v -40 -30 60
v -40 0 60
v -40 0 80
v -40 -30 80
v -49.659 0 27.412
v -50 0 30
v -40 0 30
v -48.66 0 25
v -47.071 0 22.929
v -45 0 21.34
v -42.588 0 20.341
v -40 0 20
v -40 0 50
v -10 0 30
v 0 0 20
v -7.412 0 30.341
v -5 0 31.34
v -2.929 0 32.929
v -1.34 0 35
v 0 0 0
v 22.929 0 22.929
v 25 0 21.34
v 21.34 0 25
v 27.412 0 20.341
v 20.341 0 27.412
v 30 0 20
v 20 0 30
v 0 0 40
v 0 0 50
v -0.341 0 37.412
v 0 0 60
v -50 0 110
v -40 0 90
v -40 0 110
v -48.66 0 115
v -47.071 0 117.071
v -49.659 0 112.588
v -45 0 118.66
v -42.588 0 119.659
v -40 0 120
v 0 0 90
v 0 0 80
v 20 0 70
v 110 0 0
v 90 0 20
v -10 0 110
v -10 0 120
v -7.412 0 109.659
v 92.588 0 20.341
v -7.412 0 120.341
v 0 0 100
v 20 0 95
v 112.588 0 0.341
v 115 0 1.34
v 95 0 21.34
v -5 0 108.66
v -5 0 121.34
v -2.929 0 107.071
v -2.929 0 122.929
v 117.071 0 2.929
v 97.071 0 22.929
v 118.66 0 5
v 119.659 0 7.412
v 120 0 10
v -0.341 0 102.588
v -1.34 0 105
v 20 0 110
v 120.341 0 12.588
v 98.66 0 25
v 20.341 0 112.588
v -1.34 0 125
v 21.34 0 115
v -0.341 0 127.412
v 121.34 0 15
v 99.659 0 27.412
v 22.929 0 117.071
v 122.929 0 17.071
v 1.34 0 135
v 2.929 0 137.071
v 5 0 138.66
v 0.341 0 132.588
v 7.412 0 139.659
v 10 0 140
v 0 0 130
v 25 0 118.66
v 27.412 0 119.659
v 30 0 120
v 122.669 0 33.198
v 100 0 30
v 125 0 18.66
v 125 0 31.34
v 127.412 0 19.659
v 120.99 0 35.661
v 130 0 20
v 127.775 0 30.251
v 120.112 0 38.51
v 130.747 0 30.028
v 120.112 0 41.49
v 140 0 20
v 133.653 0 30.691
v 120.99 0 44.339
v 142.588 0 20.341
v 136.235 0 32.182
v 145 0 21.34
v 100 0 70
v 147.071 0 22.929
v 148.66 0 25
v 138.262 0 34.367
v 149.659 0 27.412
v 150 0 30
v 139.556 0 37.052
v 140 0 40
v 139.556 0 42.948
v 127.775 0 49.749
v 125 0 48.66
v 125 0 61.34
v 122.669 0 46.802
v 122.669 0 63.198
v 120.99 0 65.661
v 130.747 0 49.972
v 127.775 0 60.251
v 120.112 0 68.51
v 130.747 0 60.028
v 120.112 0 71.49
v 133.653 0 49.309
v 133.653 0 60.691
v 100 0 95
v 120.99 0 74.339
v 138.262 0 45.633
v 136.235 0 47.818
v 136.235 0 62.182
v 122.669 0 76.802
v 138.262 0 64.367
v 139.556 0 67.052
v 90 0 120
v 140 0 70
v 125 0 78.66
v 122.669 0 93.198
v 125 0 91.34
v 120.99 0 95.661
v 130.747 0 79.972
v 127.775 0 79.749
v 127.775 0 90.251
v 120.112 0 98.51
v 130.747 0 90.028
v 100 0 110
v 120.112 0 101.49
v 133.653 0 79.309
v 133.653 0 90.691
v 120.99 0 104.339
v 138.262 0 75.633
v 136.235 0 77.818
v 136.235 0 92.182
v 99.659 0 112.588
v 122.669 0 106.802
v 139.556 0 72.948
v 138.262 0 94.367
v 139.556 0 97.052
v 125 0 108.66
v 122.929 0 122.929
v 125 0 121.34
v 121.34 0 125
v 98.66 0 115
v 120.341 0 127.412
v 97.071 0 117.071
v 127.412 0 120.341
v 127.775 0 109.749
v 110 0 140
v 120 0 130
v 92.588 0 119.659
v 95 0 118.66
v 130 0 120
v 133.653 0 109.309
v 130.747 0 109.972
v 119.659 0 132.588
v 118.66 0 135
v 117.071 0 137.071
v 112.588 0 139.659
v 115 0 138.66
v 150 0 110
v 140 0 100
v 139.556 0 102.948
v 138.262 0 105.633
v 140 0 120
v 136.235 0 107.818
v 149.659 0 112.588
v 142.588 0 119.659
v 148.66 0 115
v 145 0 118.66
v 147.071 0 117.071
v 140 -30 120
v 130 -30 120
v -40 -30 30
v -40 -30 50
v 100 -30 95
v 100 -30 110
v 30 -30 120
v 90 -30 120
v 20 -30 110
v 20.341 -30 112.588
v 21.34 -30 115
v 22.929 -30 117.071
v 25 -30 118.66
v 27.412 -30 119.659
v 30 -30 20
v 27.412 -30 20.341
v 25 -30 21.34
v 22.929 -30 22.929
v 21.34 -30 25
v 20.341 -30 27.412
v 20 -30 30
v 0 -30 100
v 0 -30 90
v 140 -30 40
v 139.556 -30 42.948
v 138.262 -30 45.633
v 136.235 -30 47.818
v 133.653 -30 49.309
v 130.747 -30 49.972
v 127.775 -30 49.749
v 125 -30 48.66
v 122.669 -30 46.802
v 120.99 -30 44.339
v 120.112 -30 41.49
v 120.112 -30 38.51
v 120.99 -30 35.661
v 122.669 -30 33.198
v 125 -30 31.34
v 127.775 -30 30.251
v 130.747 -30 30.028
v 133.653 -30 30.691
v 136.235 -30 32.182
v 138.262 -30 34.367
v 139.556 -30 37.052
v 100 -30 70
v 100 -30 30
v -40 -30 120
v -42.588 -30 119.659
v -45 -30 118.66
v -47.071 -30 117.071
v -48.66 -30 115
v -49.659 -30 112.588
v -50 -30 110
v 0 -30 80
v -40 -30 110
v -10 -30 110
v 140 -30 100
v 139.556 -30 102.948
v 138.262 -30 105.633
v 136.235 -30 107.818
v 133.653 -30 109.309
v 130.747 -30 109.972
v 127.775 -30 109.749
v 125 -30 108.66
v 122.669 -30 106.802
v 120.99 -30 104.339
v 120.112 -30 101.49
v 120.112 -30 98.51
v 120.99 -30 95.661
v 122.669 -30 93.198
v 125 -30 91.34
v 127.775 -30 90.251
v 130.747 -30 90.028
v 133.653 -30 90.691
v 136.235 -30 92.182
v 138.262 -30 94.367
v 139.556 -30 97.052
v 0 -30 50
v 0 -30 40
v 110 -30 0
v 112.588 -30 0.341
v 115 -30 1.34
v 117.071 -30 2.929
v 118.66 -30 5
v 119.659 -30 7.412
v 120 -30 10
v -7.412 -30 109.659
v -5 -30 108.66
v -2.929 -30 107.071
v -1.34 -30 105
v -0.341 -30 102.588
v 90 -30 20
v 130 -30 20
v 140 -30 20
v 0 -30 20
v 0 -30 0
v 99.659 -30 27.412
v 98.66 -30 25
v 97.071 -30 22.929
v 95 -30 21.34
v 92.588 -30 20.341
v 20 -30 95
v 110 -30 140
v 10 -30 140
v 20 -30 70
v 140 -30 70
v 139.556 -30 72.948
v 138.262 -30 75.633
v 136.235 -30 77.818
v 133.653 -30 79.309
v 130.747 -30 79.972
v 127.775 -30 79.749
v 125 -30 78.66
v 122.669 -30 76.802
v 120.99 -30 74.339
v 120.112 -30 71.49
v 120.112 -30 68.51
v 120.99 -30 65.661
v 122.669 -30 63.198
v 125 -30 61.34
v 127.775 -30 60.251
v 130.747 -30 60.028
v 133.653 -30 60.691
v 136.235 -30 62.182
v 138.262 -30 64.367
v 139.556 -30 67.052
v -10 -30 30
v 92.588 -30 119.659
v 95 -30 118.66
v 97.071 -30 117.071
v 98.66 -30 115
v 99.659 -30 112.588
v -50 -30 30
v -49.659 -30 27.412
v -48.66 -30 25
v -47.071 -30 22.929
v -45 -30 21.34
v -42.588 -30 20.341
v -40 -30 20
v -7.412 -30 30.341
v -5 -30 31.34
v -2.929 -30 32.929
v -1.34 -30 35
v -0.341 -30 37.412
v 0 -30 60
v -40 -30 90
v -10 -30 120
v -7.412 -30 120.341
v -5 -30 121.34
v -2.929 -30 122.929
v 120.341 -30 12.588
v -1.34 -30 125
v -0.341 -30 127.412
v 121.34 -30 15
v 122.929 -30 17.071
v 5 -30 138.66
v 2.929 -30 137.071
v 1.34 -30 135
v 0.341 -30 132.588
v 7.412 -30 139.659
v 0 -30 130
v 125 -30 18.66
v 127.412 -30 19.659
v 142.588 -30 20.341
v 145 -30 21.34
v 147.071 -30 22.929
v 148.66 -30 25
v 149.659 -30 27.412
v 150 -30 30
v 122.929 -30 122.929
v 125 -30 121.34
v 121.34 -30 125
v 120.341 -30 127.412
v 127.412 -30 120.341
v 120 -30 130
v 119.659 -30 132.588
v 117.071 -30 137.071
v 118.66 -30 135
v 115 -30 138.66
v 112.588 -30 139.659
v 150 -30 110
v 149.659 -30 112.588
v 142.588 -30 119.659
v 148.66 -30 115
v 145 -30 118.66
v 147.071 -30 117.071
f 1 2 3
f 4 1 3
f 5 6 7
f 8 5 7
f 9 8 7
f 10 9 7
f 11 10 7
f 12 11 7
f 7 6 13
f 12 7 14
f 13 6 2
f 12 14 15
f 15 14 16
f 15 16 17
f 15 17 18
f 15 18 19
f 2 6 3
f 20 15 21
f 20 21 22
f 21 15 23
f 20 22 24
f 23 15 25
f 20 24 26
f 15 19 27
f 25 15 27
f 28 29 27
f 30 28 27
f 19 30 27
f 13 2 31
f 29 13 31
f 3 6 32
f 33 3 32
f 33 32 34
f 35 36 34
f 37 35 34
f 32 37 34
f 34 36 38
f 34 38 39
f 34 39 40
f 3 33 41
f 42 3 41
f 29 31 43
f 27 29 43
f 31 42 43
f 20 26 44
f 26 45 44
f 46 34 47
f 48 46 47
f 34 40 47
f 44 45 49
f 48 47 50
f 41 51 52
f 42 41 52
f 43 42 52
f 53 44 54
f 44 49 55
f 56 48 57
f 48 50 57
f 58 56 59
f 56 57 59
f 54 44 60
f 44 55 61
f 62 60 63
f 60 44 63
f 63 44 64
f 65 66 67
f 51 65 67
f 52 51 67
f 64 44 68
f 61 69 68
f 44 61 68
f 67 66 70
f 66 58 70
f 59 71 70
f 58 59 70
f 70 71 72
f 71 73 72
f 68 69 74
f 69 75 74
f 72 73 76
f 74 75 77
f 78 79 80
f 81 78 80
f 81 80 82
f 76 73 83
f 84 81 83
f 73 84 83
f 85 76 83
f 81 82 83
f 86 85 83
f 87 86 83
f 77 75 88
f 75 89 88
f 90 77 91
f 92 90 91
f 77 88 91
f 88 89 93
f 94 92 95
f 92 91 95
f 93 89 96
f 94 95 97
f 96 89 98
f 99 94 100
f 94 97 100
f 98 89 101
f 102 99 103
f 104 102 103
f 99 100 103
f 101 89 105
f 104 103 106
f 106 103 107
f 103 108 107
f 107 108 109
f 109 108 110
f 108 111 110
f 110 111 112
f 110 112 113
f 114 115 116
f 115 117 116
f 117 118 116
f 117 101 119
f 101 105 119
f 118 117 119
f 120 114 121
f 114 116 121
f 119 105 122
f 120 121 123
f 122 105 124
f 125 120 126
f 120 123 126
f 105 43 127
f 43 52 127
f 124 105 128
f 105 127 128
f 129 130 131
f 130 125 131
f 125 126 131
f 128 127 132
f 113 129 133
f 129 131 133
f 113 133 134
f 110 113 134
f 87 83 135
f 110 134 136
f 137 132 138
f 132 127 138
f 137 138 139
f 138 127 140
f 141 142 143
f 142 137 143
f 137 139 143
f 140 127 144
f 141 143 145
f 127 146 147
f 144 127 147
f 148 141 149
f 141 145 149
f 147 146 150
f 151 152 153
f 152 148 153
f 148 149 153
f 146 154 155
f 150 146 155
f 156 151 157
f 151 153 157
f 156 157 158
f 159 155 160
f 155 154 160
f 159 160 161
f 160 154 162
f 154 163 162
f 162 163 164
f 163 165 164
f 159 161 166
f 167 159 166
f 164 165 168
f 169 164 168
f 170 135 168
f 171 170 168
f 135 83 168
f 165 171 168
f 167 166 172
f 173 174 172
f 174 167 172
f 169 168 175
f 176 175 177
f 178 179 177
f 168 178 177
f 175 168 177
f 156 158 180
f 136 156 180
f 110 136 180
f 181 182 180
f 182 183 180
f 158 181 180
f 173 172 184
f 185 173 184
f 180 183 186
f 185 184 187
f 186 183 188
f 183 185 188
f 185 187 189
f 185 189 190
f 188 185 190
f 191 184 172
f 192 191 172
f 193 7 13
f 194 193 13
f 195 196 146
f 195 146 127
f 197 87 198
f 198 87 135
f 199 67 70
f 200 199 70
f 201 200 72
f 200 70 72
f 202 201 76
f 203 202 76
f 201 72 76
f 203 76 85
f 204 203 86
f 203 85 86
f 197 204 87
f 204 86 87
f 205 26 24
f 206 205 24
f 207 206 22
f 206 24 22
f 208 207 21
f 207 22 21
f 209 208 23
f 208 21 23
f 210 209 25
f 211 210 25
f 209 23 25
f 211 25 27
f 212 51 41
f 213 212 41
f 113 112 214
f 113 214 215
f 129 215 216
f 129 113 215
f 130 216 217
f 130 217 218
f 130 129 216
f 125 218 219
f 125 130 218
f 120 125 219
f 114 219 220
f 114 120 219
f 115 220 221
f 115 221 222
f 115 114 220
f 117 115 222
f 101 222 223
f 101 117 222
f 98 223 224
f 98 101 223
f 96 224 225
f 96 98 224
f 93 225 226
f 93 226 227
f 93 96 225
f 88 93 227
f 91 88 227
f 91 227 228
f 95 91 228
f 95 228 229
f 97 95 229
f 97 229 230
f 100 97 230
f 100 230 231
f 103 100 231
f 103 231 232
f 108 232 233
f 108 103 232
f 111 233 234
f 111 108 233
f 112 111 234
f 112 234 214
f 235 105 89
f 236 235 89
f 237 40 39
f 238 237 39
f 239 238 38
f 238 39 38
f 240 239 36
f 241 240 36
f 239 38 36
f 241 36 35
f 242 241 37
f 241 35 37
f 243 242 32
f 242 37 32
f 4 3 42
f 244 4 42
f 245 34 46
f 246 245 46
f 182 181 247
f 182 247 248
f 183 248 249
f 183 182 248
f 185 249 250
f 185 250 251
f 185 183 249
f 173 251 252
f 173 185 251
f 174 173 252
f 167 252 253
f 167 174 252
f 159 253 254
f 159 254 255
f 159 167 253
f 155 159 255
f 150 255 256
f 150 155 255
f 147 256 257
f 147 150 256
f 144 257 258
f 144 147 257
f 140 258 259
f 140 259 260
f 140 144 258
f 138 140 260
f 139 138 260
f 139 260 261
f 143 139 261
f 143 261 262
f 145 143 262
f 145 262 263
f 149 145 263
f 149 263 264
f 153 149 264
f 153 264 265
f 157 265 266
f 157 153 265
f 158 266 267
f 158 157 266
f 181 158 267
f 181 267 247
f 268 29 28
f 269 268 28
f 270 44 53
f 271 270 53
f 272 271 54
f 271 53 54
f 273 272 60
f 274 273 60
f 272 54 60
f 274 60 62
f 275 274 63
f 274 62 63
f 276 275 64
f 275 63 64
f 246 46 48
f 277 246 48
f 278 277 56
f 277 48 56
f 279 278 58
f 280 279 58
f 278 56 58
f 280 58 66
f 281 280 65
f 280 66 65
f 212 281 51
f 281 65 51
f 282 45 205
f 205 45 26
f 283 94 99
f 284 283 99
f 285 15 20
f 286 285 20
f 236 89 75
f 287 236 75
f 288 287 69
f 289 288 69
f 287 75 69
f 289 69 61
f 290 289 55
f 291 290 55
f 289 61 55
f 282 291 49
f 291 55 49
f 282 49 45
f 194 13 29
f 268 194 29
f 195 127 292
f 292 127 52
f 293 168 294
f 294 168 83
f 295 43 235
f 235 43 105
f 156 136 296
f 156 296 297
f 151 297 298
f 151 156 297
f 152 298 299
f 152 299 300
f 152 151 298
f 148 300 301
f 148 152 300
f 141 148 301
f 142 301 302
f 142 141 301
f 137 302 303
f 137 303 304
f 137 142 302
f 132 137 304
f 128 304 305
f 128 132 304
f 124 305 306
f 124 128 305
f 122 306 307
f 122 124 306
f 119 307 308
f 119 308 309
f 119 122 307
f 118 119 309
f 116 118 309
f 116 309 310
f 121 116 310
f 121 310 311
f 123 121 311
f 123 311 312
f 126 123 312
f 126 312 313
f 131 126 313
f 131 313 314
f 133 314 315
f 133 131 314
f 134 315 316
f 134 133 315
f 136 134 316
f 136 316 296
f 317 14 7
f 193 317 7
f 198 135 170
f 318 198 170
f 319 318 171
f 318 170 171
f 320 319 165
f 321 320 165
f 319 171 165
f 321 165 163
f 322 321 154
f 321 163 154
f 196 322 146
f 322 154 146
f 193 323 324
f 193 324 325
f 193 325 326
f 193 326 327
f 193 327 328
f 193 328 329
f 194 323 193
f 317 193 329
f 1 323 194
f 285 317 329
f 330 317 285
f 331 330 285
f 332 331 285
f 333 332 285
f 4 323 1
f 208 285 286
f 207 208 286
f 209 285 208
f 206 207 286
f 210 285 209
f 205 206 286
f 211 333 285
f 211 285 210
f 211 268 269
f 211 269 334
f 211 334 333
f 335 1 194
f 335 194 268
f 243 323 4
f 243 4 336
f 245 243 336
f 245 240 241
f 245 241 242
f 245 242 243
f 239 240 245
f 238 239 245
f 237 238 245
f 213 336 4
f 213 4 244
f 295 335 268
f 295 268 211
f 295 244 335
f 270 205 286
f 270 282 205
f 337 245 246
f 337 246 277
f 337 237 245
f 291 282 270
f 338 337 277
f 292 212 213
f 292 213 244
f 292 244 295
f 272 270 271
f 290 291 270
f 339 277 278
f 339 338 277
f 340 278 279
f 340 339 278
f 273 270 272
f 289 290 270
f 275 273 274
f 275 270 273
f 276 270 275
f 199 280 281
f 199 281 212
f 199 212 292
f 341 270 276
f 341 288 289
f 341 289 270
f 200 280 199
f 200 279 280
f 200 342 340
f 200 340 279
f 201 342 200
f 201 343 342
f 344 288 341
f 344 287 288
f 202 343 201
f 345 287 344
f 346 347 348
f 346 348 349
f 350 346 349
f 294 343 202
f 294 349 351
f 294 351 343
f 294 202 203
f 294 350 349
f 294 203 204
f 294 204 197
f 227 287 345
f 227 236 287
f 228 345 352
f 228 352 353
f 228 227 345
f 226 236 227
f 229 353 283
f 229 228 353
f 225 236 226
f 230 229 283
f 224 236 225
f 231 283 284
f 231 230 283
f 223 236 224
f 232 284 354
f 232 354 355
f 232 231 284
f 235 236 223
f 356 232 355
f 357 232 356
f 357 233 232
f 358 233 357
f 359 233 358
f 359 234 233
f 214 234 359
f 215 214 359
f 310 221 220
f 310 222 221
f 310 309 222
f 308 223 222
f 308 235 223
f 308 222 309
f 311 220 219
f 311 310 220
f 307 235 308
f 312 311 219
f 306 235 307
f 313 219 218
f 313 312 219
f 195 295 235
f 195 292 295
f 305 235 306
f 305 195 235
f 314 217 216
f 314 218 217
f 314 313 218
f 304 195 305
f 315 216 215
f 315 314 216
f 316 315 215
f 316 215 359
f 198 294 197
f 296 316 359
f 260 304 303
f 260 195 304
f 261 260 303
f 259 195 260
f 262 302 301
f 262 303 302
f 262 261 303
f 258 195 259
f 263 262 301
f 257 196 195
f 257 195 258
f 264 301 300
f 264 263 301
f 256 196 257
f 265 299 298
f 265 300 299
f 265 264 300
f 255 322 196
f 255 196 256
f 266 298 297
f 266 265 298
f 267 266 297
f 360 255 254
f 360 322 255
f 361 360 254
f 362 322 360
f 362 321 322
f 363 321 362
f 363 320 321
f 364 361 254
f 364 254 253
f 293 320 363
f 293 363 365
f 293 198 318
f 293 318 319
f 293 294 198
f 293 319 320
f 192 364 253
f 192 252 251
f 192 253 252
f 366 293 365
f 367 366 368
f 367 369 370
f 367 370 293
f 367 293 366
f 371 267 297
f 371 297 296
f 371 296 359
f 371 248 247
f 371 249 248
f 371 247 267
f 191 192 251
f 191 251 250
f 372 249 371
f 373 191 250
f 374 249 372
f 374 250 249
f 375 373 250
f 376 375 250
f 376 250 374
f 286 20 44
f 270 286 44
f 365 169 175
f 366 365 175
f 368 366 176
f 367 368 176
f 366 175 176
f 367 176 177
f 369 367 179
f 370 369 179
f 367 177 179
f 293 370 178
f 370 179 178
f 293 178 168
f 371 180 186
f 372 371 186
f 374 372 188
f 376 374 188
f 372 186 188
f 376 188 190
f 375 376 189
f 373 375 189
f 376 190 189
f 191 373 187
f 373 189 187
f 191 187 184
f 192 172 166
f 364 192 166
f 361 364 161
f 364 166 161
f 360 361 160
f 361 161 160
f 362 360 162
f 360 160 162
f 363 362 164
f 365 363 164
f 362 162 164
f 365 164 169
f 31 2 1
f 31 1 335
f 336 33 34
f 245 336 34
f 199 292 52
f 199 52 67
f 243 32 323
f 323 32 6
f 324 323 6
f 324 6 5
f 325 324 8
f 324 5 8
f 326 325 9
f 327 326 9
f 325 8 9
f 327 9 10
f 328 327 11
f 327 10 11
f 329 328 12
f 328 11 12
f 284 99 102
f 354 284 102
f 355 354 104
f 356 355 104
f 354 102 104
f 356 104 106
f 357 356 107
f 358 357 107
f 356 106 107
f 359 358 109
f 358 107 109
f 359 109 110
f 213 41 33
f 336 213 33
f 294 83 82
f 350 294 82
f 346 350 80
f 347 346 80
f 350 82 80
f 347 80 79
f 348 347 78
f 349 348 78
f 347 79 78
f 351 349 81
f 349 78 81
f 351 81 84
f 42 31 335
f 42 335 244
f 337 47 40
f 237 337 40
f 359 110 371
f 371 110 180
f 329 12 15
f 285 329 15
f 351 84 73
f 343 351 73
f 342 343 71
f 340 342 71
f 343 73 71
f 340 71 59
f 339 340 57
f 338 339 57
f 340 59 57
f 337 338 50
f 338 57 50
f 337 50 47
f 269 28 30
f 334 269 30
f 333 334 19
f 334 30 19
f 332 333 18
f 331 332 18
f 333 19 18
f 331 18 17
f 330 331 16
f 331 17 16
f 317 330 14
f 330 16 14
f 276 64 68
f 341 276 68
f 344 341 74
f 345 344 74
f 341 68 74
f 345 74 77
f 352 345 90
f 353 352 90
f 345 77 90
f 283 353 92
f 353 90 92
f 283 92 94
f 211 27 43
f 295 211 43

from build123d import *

# Parameters (mm, degrees)
F0_R     = 10
F0_W     = 40
F0_H     = 20
F1_DEPTH = 30


with BuildPart() as f1:
    # F0 (on Front) → F1 (new body)
    with BuildSketch(Plane.XZ):
        with BuildLine():
            Line((0, 20), (0, 0))
            Line((0, 0), (110, 0))
            ThreePointArc((110, 0), (117.071068, 2.928932), (120, 10))
            ThreePointArc((120, 10), (122.928932, 17.071068), (130, 20))
            Line((130, 20), (140, 20))
            ThreePointArc((140, 20), (147.071068, 22.928932), (150, 30))
            Line((150, 30), (150, 110))
            ThreePointArc((150, 110), (147.071068, 117.071068), (140, 120))
            Line((140, 120), (130, 120))
            ThreePointArc((130, 120), (122.928932, 122.928932), (120, 130))
            ThreePointArc((120, 130), (117.071068, 137.071068), (110, 140))
            Line((110, 140), (10, 140))
            ThreePointArc((10, 140), (2.928932, 137.071068), (0, 130))
            ThreePointArc((0, 130), (-2.928932, 122.928932), (-10, 120))
            Line((-10, 120), (-40, 120))
            ThreePointArc((-40, 120), (-47.071068, 117.071068), (-50, 110))
            Line((-50, 110), (-50, 30))
            ThreePointArc((-50, 30), (-47.071068, 22.928932), (-40, 20))
            Line((-40, 20), (0, 20))
        make_face()
        with BuildLine():
            Line((-40, 30), (-40, 50))
            Line((-40, 50), (0, 50))
            Line((0, 50), (0, 40))
            ThreePointArc((0, 40), (-2.928932, 32.928932), (-10, 30))
            Line((-10, 30), (-40, 30))
        make_face(mode=Mode.SUBTRACT)
        with BuildLine():
            Line((20, 30), (20, 70))
            Line((20, 70), (100, 70))
            Line((100, 70), (100, 30))
            ThreePointArc((100, 30), (97.071068, 22.928932), (90, 20))
            Line((90, 20), (30, 20))
            ThreePointArc((30, 20), (22.928932, 22.928932), (20, 30))
        make_face(mode=Mode.SUBTRACT)
        with Locations((130, 40)):
            Circle(F0_R, mode=Mode.SUBTRACT)
        with Locations((-20, 70)):
            Rectangle(F0_W, F0_H, mode=Mode.SUBTRACT)
        with BuildLine():
            Line((-40, 90), (-40, 110))
            Line((-40, 110), (-10, 110))
            ThreePointArc((-10, 110), (-2.928932, 107.071068), (0, 100))
            Line((0, 100), (0, 90))
            Line((0, 90), (-40, 90))
        make_face(mode=Mode.SUBTRACT)
        with Locations((130, 70)):
            Circle(F0_R, mode=Mode.SUBTRACT)
        with Locations((130, 100)):
            Circle(F0_R, mode=Mode.SUBTRACT)
        with BuildLine():
            Line((100, 95), (20, 95))
            Line((20, 95), (20, 110))
            ThreePointArc((20, 110), (22.928932, 117.071068), (30, 120))
            Line((30, 120), (90, 120))
            ThreePointArc((90, 120), (97.071068, 117.071068), (100, 110))
            Line((100, 110), (100, 95))
        make_face(mode=Mode.SUBTRACT)
    extrude(amount=F1_DEPTH)


solid = f1.part
